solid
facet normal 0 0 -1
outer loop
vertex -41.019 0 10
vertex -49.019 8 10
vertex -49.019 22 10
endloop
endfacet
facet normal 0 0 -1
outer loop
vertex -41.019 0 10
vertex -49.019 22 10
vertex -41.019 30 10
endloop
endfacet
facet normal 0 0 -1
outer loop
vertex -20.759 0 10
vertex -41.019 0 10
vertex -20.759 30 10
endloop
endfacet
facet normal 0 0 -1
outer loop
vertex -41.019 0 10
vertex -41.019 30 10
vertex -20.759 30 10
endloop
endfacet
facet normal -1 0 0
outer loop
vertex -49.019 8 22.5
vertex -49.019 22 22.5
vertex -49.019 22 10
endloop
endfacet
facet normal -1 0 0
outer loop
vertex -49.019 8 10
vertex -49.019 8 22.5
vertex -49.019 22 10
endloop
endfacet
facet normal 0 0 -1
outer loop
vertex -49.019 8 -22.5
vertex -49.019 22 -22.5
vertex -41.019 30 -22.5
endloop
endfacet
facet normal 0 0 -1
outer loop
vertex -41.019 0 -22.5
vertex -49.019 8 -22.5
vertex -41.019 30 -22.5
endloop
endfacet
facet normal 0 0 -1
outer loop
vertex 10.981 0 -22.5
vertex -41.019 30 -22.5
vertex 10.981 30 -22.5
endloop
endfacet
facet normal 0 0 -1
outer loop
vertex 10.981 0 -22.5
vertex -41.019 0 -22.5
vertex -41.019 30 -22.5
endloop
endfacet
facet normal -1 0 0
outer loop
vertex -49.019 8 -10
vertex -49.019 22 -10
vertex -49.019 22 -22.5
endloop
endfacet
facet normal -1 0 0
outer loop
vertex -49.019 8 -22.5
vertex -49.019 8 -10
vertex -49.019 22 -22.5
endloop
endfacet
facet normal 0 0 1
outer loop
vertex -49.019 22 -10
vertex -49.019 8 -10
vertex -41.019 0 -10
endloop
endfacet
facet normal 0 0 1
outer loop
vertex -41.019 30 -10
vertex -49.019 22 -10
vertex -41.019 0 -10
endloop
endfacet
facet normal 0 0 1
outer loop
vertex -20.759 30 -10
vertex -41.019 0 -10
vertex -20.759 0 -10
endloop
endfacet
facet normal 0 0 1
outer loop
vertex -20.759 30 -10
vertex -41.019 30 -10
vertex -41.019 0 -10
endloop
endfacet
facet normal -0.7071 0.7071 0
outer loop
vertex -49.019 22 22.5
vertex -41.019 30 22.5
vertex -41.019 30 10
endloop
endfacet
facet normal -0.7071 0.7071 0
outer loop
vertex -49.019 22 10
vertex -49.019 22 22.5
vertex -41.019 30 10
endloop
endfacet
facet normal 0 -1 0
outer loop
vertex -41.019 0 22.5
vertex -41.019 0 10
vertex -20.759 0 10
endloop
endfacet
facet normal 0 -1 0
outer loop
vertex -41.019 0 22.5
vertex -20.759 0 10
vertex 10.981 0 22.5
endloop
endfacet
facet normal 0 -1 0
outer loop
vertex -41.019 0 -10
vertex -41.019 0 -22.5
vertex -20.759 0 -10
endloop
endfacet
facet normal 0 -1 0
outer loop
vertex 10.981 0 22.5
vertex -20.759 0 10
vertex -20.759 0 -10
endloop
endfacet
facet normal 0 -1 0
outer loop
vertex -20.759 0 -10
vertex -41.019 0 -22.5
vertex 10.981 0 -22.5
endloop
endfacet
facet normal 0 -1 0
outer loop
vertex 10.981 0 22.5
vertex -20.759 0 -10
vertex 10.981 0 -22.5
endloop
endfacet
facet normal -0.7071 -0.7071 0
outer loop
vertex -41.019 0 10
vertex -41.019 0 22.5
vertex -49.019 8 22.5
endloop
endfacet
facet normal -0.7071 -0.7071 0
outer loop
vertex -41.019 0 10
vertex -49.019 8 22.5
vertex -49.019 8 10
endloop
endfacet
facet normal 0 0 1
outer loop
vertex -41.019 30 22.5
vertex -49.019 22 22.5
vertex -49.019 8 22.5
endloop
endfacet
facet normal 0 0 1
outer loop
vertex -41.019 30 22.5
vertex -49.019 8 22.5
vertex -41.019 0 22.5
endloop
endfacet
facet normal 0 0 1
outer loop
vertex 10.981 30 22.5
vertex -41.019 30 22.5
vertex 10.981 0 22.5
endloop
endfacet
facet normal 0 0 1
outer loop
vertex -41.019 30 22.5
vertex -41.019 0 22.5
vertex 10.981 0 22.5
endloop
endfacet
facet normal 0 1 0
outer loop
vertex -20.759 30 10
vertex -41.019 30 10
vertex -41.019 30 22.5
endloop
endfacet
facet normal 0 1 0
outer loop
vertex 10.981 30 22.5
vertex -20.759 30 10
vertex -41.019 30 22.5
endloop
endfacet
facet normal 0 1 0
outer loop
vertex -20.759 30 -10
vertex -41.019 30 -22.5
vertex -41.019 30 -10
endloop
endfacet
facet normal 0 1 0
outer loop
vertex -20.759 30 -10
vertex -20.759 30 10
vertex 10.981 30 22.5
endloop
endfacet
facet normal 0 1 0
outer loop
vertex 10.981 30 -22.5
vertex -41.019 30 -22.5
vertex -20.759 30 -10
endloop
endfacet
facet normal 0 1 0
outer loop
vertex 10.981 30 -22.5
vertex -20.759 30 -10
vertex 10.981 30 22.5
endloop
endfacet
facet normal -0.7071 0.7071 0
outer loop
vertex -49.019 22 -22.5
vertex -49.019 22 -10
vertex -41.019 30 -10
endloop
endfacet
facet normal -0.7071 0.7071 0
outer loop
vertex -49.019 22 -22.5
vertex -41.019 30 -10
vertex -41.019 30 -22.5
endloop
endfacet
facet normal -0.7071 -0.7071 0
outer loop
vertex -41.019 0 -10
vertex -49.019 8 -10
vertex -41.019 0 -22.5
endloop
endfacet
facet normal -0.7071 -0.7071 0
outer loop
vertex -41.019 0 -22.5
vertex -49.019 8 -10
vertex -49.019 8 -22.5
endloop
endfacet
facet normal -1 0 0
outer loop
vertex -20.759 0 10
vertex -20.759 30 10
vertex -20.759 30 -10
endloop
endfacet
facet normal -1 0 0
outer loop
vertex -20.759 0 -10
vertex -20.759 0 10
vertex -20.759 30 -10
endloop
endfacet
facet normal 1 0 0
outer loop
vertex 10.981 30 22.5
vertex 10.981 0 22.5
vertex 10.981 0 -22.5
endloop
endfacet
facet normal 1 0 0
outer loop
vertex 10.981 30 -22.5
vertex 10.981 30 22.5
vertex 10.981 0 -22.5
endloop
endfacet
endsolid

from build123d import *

# Parameters (mm, degrees)
SKETCH_1_W          = 60
SKETCH_1_H          = 45
EXTRUDE_1_DEPTH     = 30
SKETCH_3_W          = 35.871207779
SKETCH_3_H          = 20
CUT_EXTRUDE_3_DEPTH = 62.71805709
CHAMFER_1_SIZE      = 8


with BuildPart() as part:
    # Эскиз1 → Вытянуть1 (new body)
    with BuildSketch(Plane(origin=(0, 0, 0), x_dir=(1, 0, 0), z_dir=(0, 1, 0))):
        with Locations((-19.019063342, 0)):
            Rectangle(SKETCH_1_W, SKETCH_1_H)
    extrude(amount=EXTRUDE_1_DEPTH)

    # Эскиз3 → Вытянуть3 (cut, through all)
    with BuildSketch(Plane(origin=(0, 30, 0), x_dir=(1, 0, 0), z_dir=(0, 1, 0))):
        with Locations((-38.69487705, 0)):
            Rectangle(SKETCH_3_W, SKETCH_3_H)
    extrude(amount=-CUT_EXTRUDE_3_DEPTH, mode=Mode.SUBTRACT)

    # Фаска1
    chamfer_1_edges = [part.edges().sort_by_distance(p)[0] for p in [
        (-49.019063342, 30, -16.25),
        (-49.019063342, 0, 16.25),
        (-49.019063342, 30, 16.25),
        (-49.019063342, 0, -16.25),
    ]]
    chamfer(chamfer_1_edges, length=CHAMFER_1_SIZE)


solid = part.part
